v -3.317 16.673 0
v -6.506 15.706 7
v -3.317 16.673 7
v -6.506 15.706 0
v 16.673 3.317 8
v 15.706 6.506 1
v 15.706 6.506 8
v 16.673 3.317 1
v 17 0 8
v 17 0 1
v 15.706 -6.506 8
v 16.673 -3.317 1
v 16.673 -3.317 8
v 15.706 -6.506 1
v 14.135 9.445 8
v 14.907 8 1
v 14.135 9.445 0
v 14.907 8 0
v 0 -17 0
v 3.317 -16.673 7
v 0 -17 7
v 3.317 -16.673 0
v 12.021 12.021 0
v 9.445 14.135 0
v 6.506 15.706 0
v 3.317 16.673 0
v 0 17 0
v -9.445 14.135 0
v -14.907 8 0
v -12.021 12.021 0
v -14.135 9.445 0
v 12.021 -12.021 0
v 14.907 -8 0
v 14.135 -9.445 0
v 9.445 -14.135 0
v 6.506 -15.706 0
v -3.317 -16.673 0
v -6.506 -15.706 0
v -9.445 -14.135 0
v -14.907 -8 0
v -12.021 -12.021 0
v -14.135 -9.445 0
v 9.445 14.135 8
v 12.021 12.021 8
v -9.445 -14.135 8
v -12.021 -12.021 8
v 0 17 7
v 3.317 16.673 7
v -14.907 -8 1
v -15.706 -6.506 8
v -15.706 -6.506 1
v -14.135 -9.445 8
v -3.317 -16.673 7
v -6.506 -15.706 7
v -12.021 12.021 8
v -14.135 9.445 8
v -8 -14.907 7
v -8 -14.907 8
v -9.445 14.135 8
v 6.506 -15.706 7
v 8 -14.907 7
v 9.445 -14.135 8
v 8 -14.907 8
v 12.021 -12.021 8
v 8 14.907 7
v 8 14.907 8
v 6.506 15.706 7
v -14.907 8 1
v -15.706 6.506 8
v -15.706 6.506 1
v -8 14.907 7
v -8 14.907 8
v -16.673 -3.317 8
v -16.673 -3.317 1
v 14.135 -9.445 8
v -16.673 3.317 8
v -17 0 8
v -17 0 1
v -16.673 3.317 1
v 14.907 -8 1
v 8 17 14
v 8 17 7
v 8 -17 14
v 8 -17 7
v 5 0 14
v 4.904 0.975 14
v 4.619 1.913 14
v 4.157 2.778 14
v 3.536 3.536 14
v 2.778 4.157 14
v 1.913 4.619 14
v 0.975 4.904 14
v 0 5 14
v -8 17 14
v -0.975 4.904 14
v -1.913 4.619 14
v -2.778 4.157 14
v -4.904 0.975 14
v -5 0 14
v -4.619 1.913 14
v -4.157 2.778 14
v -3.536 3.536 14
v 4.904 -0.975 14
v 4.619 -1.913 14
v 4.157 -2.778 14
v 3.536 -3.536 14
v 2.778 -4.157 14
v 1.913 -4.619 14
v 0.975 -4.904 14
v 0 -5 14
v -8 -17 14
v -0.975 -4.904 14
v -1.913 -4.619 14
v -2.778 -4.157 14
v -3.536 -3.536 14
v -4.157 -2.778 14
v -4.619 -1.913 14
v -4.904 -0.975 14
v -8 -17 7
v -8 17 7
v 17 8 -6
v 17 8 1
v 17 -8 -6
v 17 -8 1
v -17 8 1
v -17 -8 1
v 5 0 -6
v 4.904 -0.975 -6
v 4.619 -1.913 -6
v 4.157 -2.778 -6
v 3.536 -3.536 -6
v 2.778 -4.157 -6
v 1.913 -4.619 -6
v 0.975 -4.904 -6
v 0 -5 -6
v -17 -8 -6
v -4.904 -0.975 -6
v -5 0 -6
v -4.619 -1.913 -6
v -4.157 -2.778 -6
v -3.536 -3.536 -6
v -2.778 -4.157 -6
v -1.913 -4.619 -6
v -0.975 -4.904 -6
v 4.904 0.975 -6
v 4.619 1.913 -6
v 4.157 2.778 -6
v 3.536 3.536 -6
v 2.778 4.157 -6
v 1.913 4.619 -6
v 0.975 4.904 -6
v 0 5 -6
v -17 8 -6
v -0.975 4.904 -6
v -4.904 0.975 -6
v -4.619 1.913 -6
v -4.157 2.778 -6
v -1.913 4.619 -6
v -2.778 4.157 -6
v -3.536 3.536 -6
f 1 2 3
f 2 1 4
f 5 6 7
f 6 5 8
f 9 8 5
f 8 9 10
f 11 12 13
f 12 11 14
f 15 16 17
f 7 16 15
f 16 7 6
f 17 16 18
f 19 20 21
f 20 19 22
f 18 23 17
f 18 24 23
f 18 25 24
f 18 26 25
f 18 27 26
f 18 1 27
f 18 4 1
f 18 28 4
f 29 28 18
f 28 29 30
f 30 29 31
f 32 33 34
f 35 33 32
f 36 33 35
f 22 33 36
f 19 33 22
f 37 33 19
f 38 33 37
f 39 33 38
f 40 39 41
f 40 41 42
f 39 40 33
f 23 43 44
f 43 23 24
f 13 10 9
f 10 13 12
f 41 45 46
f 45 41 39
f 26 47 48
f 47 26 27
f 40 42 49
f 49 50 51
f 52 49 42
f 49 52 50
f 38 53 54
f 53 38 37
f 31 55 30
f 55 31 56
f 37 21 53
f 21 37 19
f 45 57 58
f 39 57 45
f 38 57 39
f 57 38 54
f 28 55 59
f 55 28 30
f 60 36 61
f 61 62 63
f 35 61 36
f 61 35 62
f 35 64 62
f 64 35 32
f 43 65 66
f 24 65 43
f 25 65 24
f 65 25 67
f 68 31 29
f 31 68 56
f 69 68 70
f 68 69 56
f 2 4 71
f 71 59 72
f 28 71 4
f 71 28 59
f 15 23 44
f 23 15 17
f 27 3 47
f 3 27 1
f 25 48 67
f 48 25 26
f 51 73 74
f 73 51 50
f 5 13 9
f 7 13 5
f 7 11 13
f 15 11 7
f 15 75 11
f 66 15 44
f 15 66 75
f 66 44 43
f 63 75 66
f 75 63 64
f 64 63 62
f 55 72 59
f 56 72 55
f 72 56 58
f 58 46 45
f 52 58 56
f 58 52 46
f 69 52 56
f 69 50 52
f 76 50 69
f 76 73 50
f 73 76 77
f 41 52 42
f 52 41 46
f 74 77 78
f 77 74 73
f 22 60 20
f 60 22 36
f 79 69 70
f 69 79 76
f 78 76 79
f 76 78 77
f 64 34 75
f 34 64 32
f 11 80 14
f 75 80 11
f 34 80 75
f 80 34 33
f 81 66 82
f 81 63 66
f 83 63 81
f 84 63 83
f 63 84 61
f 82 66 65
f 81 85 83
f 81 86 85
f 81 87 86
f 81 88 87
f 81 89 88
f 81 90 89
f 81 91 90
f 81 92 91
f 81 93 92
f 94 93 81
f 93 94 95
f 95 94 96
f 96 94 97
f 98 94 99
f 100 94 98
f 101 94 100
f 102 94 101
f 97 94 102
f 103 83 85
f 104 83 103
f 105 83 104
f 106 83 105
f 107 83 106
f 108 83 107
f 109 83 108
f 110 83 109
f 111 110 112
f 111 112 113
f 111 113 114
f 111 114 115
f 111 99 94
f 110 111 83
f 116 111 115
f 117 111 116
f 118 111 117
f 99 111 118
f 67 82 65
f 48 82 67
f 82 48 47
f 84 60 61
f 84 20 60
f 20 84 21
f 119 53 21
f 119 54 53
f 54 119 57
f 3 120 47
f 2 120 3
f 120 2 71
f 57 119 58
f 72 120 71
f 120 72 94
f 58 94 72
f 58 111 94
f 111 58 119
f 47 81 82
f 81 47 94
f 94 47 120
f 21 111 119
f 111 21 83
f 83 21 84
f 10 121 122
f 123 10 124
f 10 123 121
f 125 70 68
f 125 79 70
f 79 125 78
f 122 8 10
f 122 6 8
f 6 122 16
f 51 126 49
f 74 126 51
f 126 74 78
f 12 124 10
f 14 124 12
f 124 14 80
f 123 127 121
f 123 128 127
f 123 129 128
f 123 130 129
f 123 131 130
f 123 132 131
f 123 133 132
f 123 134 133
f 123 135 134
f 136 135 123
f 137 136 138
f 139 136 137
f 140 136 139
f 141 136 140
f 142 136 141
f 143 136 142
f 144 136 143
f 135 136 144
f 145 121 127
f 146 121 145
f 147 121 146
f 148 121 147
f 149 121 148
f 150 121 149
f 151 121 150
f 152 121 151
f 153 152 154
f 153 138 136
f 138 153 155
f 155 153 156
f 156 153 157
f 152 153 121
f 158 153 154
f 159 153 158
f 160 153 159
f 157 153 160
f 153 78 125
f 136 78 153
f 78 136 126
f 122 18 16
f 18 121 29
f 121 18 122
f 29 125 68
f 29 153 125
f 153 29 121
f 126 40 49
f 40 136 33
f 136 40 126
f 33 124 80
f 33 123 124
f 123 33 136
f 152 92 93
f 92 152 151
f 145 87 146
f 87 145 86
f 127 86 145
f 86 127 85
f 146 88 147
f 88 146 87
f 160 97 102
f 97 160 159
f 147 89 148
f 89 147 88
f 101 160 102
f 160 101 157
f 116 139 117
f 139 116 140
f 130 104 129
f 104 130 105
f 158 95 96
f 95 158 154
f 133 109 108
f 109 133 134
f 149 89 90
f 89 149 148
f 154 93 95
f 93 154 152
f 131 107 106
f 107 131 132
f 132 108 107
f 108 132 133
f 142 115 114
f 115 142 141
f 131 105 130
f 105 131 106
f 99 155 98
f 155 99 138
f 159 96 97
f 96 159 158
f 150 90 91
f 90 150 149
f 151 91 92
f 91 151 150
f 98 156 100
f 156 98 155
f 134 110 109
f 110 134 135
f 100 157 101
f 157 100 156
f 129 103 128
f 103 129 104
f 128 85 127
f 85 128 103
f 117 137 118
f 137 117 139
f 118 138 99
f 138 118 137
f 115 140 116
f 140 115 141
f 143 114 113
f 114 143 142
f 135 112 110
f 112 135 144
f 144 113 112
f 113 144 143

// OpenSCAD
$fn = 32;

// ----------------------------------------------------------------------
// Oldham coupling disc: 34 x 20 mm
// ----------------------------------------------------------------------

// --- parameters (mm) ---
disc_d = 34;              // disc diameter
disc_t = 8;               // disc thickness
tongue_w = 16;            // tongue width
tongue_h = 6;             // tongue height
bore_d = 10;              // centre lightening bore

module disc() {
  cylinder(h = disc_t, d = disc_d);
  /* tongue on the top face, sunk 1 mm into the disc */
  translate([-tongue_w / 2, -disc_d / 2, disc_t - 1]) cube([tongue_w, disc_d, tongue_h + 1]);
  /* slot wall on the bottom face, 90 degrees turned */
  translate([-disc_d / 2, -tongue_w / 2, -tongue_h]) cube([disc_d, tongue_w, tongue_h + 1]);
}

difference() {
  disc();
  translate([0, 0, -tongue_h - 1]) cylinder(h = disc_t + 2 * tongue_h + 2, d = bore_d);
}
